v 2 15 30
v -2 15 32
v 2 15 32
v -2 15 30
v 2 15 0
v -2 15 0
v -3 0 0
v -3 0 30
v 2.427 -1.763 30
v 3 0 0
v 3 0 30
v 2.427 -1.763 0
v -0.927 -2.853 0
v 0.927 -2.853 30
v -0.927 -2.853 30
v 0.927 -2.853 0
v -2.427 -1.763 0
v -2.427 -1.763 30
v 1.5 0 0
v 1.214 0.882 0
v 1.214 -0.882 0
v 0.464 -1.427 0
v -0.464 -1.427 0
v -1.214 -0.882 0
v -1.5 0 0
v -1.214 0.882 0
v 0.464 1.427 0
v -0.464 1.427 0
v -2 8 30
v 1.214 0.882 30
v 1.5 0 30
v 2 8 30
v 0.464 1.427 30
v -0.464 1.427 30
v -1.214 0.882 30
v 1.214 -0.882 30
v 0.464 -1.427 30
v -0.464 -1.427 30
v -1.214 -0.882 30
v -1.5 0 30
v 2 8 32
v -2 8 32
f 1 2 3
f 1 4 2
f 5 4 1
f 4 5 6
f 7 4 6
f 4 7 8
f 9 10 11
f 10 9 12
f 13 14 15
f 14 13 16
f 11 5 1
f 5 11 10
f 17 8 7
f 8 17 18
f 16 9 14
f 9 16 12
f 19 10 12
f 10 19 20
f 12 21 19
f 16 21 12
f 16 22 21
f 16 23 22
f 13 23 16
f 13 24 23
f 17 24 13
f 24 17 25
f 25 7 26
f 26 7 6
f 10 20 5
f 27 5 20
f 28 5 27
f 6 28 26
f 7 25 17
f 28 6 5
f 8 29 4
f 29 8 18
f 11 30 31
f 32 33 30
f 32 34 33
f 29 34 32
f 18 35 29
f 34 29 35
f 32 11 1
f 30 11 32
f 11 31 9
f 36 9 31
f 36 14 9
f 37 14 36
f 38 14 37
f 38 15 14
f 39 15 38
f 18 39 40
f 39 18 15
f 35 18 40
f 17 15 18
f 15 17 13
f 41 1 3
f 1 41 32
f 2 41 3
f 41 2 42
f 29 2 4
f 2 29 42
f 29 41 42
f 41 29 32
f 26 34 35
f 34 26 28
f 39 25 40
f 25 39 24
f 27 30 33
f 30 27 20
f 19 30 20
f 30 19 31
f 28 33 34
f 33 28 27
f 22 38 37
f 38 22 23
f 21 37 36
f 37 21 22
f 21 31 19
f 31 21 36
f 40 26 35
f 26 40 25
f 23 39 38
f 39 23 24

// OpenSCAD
module pillar() {
    difference() {
        union() {
            hull(){
                cylinder(30, 3, 3);
                translate([-2, 8, 0]) cube([4, 7, 30]);
            }
            translate([-2, 8, 0]) cube([4, 7, 32]);
        }
        translate([0, 0, -1]) cylinder(32, 1.5, 1.5, $fn=10);
    }
}

pillar();
